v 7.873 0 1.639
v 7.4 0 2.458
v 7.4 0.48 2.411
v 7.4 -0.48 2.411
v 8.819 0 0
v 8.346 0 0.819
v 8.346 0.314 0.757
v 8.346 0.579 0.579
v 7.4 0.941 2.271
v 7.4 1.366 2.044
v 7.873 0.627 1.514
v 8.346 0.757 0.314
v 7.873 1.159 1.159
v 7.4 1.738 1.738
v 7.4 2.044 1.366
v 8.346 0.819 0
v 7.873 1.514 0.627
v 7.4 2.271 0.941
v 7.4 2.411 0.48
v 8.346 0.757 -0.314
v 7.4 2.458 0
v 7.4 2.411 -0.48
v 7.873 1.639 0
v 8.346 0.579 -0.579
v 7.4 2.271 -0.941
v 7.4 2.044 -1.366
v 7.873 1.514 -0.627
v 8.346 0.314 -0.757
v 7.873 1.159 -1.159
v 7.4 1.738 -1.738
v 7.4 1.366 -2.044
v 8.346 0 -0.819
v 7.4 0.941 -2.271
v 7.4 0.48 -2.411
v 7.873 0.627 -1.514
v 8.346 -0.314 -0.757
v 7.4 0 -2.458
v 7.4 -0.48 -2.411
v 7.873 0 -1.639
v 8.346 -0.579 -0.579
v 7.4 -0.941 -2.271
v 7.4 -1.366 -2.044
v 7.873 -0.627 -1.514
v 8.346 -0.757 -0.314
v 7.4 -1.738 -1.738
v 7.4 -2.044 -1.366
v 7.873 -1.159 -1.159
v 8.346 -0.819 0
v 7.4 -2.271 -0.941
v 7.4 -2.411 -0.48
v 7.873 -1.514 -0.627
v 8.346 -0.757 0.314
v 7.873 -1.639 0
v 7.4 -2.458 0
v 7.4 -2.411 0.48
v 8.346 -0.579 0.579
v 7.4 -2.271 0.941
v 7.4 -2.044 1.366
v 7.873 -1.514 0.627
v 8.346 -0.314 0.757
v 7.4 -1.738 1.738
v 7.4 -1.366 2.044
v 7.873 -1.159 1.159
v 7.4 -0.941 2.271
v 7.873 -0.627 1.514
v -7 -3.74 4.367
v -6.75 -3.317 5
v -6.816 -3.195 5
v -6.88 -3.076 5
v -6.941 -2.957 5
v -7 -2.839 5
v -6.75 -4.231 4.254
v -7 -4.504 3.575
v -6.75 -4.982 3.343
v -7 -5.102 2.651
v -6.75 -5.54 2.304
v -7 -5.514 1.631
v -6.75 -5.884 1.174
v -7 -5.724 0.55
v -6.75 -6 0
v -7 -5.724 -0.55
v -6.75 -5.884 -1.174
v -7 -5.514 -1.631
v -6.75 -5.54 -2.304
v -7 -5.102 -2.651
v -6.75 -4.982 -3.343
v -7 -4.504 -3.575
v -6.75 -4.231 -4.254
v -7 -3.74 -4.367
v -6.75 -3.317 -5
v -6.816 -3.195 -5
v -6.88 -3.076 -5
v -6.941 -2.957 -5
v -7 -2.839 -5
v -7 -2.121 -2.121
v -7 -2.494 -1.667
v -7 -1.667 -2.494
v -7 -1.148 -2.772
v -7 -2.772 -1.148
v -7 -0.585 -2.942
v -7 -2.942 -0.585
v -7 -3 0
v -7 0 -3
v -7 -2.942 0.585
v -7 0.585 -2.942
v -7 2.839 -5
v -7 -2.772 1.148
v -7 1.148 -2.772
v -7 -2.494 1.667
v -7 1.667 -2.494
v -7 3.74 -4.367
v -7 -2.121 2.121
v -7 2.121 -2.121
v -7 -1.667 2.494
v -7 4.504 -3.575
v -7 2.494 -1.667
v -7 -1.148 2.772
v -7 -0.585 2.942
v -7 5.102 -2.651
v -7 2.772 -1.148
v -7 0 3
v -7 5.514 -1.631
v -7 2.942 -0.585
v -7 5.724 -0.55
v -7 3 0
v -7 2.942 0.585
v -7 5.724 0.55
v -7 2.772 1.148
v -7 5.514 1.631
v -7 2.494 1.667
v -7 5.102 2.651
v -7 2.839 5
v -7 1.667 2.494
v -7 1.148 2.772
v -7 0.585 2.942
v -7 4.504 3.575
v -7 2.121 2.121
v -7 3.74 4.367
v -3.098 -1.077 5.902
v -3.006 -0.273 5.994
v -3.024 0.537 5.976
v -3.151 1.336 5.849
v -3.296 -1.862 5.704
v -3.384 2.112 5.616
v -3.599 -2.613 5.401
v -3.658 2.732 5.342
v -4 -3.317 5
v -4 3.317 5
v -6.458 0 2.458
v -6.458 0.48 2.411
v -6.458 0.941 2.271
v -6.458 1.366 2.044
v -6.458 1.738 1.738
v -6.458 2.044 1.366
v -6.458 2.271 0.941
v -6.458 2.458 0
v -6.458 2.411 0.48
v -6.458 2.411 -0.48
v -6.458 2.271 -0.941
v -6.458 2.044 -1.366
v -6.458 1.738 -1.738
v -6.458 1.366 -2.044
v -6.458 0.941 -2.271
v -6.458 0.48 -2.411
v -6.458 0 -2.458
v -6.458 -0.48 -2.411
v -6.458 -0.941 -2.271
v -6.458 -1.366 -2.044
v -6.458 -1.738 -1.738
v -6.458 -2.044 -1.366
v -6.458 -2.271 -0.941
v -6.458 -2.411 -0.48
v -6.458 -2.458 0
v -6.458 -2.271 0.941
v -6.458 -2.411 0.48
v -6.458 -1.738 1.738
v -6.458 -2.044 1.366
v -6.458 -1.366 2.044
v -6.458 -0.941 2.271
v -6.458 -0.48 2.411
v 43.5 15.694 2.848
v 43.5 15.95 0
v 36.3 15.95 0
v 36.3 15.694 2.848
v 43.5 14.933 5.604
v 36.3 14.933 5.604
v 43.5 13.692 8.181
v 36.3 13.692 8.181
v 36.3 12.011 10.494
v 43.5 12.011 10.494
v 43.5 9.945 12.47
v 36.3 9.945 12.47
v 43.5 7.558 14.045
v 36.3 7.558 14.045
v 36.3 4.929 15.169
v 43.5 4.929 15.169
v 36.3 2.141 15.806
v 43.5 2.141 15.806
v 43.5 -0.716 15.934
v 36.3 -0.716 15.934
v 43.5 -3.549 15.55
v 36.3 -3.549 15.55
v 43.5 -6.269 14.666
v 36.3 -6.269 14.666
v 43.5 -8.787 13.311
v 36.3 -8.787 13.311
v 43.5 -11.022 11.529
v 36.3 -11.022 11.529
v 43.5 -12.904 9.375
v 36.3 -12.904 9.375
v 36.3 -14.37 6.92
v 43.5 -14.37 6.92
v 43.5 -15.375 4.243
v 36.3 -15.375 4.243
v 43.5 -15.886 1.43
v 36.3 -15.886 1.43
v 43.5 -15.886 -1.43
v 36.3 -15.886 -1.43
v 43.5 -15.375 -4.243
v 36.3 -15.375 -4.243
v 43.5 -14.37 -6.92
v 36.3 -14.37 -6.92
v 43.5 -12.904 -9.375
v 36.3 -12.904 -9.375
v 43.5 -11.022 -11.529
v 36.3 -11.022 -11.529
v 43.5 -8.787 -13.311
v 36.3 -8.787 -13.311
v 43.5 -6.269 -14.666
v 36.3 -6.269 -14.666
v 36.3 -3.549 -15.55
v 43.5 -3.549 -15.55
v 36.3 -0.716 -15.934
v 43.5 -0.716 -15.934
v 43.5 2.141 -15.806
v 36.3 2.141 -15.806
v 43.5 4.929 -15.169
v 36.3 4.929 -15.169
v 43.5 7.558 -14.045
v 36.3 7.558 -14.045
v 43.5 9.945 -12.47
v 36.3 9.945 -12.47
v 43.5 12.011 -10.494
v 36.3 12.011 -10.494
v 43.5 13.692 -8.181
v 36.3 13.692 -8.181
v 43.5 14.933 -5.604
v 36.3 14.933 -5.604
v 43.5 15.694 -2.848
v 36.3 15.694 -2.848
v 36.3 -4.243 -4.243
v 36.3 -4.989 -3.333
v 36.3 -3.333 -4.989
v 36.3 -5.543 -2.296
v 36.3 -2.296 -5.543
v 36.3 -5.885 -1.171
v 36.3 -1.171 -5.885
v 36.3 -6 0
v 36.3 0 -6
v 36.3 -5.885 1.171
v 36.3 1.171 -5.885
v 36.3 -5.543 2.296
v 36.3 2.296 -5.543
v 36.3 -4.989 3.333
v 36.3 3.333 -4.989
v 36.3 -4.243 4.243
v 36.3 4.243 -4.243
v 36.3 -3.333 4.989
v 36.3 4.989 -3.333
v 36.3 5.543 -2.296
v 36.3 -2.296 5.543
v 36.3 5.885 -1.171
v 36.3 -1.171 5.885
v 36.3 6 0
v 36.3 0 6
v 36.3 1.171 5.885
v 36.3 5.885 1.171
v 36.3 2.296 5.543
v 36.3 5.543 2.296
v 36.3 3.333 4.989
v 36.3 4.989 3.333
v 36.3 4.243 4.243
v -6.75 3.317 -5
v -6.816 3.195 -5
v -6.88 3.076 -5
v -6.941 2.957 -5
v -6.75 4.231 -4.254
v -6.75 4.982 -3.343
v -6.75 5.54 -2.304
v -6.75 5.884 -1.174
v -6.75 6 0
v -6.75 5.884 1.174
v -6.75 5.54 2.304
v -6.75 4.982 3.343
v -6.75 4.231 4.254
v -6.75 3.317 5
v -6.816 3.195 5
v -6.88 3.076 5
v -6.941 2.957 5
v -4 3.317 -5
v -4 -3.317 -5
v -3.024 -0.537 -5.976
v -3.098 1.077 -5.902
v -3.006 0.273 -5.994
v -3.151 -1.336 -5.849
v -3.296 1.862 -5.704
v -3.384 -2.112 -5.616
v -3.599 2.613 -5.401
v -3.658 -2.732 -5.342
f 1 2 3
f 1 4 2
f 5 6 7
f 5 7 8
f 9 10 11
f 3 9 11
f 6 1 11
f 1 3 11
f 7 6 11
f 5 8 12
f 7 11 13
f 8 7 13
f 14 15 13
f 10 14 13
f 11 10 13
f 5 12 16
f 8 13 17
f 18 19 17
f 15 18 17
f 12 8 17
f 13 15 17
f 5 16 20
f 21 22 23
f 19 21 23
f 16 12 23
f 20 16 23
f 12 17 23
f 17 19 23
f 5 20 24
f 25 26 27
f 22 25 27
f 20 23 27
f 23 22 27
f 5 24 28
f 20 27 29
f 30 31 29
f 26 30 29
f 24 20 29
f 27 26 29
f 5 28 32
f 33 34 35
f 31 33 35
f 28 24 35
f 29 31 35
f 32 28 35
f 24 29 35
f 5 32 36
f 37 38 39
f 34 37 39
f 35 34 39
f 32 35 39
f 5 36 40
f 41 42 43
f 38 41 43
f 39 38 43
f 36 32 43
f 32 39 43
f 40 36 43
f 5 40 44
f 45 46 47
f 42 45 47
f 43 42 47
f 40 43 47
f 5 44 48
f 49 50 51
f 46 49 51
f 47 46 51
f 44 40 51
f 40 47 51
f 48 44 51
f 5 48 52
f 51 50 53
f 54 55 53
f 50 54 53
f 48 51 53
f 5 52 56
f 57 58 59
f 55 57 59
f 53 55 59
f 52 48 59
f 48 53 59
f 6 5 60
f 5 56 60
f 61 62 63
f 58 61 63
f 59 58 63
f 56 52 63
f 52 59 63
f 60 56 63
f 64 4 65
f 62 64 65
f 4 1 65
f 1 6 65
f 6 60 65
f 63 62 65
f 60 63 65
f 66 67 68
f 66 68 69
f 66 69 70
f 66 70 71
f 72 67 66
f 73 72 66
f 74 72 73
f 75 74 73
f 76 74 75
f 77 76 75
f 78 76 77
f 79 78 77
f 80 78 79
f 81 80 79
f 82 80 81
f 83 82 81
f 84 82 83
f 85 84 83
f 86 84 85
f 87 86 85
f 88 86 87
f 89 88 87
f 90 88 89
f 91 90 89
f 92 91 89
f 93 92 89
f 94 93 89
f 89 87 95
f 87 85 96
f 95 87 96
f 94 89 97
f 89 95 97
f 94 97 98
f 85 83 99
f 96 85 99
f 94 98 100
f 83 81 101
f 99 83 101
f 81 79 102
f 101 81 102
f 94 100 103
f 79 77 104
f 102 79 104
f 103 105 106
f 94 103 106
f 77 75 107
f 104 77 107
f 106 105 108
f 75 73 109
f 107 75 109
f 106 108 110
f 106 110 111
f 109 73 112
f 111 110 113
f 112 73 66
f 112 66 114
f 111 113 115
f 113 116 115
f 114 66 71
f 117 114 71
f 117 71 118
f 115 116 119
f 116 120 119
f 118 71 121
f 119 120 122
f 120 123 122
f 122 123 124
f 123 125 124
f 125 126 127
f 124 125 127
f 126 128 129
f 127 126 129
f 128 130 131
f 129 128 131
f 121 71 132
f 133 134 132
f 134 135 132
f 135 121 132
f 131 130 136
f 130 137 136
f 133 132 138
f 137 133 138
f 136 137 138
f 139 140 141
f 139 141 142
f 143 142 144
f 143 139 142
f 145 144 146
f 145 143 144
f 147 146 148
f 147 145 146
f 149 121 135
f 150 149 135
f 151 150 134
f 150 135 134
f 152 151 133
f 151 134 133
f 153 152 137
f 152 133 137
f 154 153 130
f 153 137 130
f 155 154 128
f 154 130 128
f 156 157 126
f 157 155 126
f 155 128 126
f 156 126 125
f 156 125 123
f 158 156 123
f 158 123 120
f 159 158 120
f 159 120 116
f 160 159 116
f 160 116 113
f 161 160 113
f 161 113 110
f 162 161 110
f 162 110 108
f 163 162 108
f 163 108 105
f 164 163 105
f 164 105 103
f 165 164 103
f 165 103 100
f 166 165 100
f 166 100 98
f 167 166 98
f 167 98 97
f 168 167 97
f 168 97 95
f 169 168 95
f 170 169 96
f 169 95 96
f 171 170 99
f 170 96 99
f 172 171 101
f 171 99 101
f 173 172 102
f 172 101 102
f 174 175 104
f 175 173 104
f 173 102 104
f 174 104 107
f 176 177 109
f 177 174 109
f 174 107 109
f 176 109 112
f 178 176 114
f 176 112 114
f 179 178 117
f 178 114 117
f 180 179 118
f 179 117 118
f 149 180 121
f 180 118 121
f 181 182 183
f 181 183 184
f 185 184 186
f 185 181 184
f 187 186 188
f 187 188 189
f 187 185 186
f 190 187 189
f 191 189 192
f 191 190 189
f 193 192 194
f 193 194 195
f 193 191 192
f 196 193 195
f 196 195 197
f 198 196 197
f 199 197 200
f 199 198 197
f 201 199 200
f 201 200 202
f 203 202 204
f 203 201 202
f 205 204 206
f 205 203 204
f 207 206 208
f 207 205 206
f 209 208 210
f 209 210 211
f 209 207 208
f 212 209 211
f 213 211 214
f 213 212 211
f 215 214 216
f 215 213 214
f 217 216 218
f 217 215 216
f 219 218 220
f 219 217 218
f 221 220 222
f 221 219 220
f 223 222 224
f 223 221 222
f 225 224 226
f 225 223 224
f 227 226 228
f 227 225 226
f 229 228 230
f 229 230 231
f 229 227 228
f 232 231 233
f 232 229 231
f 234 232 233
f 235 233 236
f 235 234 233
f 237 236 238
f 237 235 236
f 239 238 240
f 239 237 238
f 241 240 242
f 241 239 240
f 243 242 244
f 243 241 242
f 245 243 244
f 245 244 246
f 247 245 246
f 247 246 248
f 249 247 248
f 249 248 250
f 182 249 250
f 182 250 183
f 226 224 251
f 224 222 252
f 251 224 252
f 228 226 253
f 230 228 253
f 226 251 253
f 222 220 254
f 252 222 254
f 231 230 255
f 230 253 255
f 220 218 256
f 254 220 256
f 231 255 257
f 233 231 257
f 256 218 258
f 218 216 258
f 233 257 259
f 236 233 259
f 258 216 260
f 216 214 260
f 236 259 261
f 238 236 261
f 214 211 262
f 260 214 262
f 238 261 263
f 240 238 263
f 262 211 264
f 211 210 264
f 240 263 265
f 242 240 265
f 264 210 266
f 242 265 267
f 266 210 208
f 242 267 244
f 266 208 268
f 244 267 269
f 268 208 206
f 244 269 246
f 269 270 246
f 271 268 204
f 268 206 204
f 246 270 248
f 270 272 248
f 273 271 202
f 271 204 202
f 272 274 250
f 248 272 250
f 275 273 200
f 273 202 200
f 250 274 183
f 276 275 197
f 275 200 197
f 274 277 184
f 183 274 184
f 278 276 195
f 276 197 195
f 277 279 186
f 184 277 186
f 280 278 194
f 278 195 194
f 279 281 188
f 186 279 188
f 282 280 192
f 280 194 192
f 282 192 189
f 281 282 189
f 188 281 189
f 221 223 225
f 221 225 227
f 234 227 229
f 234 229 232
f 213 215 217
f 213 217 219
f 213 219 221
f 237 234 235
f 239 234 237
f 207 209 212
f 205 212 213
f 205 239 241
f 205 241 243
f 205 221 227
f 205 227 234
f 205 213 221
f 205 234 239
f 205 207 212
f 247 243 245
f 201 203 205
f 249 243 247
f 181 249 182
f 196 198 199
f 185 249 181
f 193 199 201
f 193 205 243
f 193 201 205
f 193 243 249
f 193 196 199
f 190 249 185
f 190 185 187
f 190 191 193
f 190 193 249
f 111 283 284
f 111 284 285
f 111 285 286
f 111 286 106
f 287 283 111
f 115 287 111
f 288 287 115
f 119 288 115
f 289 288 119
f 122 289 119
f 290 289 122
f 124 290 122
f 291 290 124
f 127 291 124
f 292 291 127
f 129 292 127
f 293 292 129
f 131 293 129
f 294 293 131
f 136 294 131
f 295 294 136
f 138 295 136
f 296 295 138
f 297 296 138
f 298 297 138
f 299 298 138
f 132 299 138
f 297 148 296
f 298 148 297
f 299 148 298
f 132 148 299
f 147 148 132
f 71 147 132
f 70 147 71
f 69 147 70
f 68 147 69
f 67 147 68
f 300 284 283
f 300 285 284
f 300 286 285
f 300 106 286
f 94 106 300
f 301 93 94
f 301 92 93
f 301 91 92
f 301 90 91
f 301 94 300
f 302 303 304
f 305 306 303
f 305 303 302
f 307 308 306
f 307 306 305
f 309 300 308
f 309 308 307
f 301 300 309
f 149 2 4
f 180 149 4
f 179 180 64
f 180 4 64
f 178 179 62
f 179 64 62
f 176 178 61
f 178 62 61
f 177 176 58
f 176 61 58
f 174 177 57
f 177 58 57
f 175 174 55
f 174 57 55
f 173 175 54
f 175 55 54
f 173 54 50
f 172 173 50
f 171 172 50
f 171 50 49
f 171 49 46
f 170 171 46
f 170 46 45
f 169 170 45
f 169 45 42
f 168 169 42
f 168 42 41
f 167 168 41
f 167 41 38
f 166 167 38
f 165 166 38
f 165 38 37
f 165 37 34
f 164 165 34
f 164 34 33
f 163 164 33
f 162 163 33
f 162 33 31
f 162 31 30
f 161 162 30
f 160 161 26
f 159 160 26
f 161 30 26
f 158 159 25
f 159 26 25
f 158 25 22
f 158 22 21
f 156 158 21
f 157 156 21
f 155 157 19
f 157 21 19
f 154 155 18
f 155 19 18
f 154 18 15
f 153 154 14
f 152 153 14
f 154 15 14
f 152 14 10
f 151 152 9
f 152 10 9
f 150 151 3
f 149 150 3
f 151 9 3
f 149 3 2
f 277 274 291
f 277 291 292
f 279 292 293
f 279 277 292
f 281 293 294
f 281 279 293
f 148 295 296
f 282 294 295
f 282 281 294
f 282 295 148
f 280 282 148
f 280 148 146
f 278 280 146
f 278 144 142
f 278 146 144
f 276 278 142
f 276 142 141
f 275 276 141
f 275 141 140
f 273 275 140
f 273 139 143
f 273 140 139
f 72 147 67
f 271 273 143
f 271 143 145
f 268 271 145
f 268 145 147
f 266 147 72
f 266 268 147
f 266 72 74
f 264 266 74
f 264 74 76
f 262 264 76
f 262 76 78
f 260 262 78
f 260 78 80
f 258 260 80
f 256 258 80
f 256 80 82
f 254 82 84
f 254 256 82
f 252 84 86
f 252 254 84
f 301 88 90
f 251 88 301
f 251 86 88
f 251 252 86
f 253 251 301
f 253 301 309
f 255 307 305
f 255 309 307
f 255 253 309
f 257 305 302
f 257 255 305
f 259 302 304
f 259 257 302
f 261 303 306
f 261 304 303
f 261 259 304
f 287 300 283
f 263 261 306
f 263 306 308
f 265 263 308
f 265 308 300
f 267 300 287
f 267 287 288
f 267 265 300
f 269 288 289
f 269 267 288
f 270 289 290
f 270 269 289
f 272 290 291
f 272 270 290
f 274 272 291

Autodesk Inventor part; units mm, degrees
sketch "Sketch_12" plane through (0, 0, 0) normal (0, 0, 1) x (1, 0, 0)
  line L0 (0, 0) -> (-7, 0)
  line L1 (-7, 0) -> (-7, 5.75)
  line L2 (-7, 5.75) -> (-6.75, 6)
  line L3 (-6.75, 6) -> (0, 6)
  line L4 (0, 6) -> (0, 0)
  line L5 (0, 0) -> (-7, 0)
revolve "Revolution1" add sketch "Sketch_12" angle 360 about axis through (0, 0, 0) along (1, 0, 0)
sketch "Sketch_16" plane through (0, 0, 0) normal (0, 0, 1) x (1, 0, 0)
  line L0 (43.5, 0) -> (0, 0)
  line L1 (0, 0) -> (0, 6)
  line L2 (0, 6) -> (36.3, 6)
  line L3 (36.3, 6) -> (36.3, 15.95)
  line L4 (36.3, 15.95) -> (43.5, 15.95)
  line L5 (43.5, 15.95) -> (43.5, 0)
  line L6 (43.5, 0) -> (0, 0)
revolve "Revolution2" add sketch "Sketch_16" angle 360 about axis through (43.5, 0, 0) along (1, 0, 0)
sketch "Sketch_13" plane through (0, 0, 0) normal (0, 1, 0) x (-1, 0, 0)
  line L0 (17, -10) -> (17, 10)
  line L1 (17, 10) -> (-1, 10)
  line L2 (-1, 10) -> (4, 5)
  line L3 (4, 5) -> (7, 5)
  line L4 (7, 5) -> (7, -5)
  line L5 (7, -5) -> (4, -5)
  line L6 (4, -5) -> (-1, -10)
  line L7 (-1, -10) -> (17, -10)
extrude "Extrusion1" cut sketch "Sketch_13" along normal mid plane 20
sketch "Sketch4" plane through (-7, -2.8395, 5) normal (-1, 0, 0) x (0, 0, 1)
  point P0 (-5, 2.8395)
hole "Hole1" at (-7, 0, 0) direction (1, 0, 0) diameter 4.917 depth 14.4 tip angle 120 countersink diameter 6 countersink angle 90 thread size "M6x1" class "6H" standard "ISO Metric profile"
ref_plane "for_body_XY" through (0, 0, 0) normal (1, 0, 0) x (0, 0, -1)
ref_plane "for_body_YZ" through (0, 0, 0) normal (0, 0, -1) x (0, 1, 0)
ref_plane "for_body_ZX" through (0, 0, 0) normal (0, 1, 0) x (1, 0, 0)
ref_plane "for_nut_XY" through (-17.5, 0, 0) normal (-1, 0, 0) x (0, 0, -1)
ref_plane "for_nut_YZ" through (-17.5, 0, 0) normal (0, 0, -1) x (0, -1, 0)
ref_plane "for_nut_ZX" through (-17.5, 0, 0) normal (0, -1, 0) x (-1, 0, 0)
properties part number "SDA-32x2525_r"
